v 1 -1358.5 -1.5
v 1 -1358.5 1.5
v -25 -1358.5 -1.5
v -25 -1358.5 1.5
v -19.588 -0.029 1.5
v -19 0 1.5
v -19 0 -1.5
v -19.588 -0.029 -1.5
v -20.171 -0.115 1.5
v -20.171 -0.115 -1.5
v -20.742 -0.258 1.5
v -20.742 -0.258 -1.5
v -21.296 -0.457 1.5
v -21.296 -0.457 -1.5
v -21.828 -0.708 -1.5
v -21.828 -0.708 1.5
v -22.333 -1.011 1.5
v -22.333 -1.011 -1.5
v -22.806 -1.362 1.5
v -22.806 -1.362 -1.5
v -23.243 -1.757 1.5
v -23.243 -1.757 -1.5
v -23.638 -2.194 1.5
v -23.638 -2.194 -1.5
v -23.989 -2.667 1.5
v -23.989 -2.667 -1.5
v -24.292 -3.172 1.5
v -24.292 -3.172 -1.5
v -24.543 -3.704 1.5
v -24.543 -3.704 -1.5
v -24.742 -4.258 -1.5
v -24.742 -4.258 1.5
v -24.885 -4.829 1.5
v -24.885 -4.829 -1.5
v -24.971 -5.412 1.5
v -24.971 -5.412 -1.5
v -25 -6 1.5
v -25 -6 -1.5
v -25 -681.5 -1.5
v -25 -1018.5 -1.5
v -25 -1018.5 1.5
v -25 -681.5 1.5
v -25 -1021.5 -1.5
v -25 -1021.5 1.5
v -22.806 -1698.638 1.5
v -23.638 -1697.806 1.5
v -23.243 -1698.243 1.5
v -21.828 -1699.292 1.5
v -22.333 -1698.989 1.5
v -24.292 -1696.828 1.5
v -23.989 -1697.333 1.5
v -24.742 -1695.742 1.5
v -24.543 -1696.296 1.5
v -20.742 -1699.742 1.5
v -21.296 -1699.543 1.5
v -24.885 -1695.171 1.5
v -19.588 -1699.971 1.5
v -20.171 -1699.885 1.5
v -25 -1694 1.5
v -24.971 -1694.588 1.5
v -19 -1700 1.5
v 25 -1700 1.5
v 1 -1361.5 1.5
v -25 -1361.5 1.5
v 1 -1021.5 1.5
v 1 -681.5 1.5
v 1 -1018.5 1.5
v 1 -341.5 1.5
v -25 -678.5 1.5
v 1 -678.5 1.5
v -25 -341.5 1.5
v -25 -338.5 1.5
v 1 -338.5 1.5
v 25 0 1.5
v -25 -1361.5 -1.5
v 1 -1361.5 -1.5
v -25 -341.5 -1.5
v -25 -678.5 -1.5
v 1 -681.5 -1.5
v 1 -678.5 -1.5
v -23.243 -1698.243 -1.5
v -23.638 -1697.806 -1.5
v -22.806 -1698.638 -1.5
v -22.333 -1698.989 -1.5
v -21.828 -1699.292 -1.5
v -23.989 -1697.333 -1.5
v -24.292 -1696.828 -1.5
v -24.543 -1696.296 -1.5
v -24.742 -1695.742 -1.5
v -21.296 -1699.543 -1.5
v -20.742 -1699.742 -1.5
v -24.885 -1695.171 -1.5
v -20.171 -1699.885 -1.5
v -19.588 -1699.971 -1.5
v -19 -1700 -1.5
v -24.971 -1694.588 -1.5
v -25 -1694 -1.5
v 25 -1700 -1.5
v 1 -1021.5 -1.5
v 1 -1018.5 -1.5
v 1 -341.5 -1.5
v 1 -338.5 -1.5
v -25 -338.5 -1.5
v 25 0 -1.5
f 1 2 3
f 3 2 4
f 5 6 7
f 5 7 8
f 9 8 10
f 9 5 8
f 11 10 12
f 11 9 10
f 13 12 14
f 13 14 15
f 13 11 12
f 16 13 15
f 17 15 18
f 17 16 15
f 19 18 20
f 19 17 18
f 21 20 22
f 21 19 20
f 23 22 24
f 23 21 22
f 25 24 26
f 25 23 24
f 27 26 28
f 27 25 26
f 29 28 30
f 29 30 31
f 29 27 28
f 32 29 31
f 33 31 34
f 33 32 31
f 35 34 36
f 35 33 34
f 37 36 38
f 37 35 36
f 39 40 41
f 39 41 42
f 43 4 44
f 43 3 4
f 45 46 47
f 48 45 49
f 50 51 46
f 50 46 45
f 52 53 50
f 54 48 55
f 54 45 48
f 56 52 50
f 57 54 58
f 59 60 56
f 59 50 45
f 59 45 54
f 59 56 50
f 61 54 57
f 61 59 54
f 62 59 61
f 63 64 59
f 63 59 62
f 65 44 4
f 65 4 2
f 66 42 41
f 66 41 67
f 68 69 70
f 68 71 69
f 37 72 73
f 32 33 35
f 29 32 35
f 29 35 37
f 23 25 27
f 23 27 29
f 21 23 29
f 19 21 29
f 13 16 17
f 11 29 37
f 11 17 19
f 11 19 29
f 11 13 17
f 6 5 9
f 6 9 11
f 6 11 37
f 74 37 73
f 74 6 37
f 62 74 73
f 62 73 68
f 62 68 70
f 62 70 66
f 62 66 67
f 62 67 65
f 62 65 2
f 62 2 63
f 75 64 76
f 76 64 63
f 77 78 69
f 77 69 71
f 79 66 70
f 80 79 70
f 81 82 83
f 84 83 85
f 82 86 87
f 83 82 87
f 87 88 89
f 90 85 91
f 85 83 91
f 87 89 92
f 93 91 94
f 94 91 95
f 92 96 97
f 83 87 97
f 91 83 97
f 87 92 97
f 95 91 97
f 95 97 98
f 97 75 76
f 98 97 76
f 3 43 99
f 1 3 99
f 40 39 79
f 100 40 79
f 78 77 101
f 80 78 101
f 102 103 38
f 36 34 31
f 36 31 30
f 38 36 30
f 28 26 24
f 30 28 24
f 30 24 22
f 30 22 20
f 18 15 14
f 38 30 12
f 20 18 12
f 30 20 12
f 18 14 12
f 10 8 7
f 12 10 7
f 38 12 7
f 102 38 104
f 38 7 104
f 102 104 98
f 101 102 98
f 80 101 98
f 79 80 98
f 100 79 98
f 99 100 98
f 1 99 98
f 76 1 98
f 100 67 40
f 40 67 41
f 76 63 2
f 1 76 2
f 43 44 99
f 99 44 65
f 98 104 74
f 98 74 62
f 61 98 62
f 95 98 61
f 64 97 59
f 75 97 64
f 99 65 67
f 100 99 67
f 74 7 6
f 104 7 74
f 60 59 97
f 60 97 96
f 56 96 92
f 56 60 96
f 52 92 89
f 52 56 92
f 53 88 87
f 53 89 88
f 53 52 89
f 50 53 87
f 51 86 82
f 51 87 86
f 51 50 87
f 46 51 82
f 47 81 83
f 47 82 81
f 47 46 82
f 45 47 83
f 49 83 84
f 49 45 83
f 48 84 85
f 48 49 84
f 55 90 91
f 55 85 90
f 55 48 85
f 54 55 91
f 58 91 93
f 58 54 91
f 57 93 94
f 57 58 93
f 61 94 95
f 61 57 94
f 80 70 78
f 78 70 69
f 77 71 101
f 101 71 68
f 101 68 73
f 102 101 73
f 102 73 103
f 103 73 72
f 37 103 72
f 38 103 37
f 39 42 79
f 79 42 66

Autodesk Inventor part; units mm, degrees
ref_plane "YZ Plane" through (0, 0, 0) normal (1, 0, 0) x (0, 1, 0)
ref_plane "XZ Plane" through (0, 0, 0) normal (0, 1, 0) x (-1, 0, 0)
ref_plane "XY Plane" through (0, 0, 0) normal (0, 0, 1) x (1, 0, 0)
sketch "Sketch1" plane through (0, 0, 0) normal (0, 0, 1) x (1, 0, 0)
  line L0 (-25, 0) -> (25, 0)
  line L1 (25, 0) -> (25, -1700)
  line L2 (25, -1700) -> (-25, -1700)
  line L3 (-25, -1700) -> (-25, 0)
  point P0 (0, 0)
  point P1 (0, 0)
  point P2 (-25, -1153.2713)
  dimension "d0" = 50
  dimension "d1" = 1700
extrude "Plate1" add sketch "Sketch1" along normal mid plane 3
sketch "Sketch2" plane through (0, 0, 1.5) normal (0, 0, 1) x (1, 0, 0)
  line L0 (-25, -1021.5) -> (1, -1021.5)
  line L1 (1, -1021.5) -> (1, -1018.5)
  line L2 (1, -1018.5) -> (-25, -1018.5)
  line L3 (-25, -1018.5) -> (-25, -1021.5)
  line L4 (-25, -1700) -> (-25, 0) projected
  line L5 (-25, -1361.5) -> (1, -1361.5)
  line L6 (1, -1361.5) -> (1, -1358.5)
  line L7 (1, -1358.5) -> (-25, -1358.5)
  line L8 (-25, -1358.5) -> (-25, -1361.5)
  line L9 (-25, -681.5) -> (1, -681.5)
  line L10 (1, -681.5) -> (1, -678.5)
  line L11 (1, -678.5) -> (-25, -678.5)
  line L12 (-25, -678.5) -> (-25, -681.5)
  line L13 (-25, -341.5) -> (1, -341.5)
  line L14 (1, -341.5) -> (1, -338.5)
  line L15 (1, -338.5) -> (-25, -338.5)
  line L16 (-25, -338.5) -> (-25, -341.5)
  point P0 (0, 0)
  point P1 (-25, -1020)
  point P2 (-25, -850)
  point P3 (-25, -1360)
  point P4 (-25, -680)
  point P5 (-25, -850)
  point P6 (-25, -340)
  point P7 (-25, -338.5)
  point P8 (-25, -341.5)
  point P9 (-25, -678.5)
  point P10 (-25, -681.5)
  point P11 (-25, -1358.5)
  point P12 (-25, -1361.5)
  dimension "d15" = 26
  dimension "d16" = 3
  dimension "d17" = 170
  dimension "d20" = 26
  dimension "d21" = 3
  dimension "d22" = 340
  dimension "d23" = 26
  dimension "d24" = 3
  dimension "d25" = 170
  dimension "d26" = 340
  dimension "d27" = 3
  dimension "d28" = 26
extrude "Extrusion1" cut sketch "Sketch2" against normal through all
fillet "Corner Round3" radius 6 2 edges at (-25, 0, 0) (-25, -1700, 0)
sketch "Sketch3" plane through (0, 0, 1.5) normal (0, 0, 1) x (1, 0, 0)
  line L0 (-5.1757, -47.7196) -> (3.8521, -47.7196) construction
  line L1 (3.8521, -47.7196) -> (3.8521, -156.6657) construction
  line L2 (3.8521, -156.6657) -> (-5.1757, -156.6657) construction
  line L3 (-5.1757, -156.6657) -> (-5.1757, -47.7196) construction
  point P0 (0, 0)
mark "Mark1"
equation "\"d17\" = d25"
equation "\"d20\" = d15"
equation "\"d21\" = d16"
equation "\"d22\" = d26"
equation "\"d23\" = d15"
equation "\"d24\" = d16"
equation "\"d27\" = d24"
equation "\"d28\" = d23"
equation "\"d2\" = Thickness"
equation "\"BendReliefWidth\" = Thickness"
equation "\"BendReliefDepth\" = 0.5 * Thickness"
equation "\"CornerReliefSize\" = 4 * Thickness"
equation "\"MinimumRemnant\" = 2 * Thickness"
equation "\"TransitionRadius\" = BendRadius"
equation "\"JacobiRadiusSize\" = BendRadius"
equation "\"GapSize\" = Thickness"
equation "\"Thickness\" = 3"
equation "\"BendRadius\" = 5"
properties part number "MSC 604 RIB CONE EXIT BACK" material "Stainless Steel"
